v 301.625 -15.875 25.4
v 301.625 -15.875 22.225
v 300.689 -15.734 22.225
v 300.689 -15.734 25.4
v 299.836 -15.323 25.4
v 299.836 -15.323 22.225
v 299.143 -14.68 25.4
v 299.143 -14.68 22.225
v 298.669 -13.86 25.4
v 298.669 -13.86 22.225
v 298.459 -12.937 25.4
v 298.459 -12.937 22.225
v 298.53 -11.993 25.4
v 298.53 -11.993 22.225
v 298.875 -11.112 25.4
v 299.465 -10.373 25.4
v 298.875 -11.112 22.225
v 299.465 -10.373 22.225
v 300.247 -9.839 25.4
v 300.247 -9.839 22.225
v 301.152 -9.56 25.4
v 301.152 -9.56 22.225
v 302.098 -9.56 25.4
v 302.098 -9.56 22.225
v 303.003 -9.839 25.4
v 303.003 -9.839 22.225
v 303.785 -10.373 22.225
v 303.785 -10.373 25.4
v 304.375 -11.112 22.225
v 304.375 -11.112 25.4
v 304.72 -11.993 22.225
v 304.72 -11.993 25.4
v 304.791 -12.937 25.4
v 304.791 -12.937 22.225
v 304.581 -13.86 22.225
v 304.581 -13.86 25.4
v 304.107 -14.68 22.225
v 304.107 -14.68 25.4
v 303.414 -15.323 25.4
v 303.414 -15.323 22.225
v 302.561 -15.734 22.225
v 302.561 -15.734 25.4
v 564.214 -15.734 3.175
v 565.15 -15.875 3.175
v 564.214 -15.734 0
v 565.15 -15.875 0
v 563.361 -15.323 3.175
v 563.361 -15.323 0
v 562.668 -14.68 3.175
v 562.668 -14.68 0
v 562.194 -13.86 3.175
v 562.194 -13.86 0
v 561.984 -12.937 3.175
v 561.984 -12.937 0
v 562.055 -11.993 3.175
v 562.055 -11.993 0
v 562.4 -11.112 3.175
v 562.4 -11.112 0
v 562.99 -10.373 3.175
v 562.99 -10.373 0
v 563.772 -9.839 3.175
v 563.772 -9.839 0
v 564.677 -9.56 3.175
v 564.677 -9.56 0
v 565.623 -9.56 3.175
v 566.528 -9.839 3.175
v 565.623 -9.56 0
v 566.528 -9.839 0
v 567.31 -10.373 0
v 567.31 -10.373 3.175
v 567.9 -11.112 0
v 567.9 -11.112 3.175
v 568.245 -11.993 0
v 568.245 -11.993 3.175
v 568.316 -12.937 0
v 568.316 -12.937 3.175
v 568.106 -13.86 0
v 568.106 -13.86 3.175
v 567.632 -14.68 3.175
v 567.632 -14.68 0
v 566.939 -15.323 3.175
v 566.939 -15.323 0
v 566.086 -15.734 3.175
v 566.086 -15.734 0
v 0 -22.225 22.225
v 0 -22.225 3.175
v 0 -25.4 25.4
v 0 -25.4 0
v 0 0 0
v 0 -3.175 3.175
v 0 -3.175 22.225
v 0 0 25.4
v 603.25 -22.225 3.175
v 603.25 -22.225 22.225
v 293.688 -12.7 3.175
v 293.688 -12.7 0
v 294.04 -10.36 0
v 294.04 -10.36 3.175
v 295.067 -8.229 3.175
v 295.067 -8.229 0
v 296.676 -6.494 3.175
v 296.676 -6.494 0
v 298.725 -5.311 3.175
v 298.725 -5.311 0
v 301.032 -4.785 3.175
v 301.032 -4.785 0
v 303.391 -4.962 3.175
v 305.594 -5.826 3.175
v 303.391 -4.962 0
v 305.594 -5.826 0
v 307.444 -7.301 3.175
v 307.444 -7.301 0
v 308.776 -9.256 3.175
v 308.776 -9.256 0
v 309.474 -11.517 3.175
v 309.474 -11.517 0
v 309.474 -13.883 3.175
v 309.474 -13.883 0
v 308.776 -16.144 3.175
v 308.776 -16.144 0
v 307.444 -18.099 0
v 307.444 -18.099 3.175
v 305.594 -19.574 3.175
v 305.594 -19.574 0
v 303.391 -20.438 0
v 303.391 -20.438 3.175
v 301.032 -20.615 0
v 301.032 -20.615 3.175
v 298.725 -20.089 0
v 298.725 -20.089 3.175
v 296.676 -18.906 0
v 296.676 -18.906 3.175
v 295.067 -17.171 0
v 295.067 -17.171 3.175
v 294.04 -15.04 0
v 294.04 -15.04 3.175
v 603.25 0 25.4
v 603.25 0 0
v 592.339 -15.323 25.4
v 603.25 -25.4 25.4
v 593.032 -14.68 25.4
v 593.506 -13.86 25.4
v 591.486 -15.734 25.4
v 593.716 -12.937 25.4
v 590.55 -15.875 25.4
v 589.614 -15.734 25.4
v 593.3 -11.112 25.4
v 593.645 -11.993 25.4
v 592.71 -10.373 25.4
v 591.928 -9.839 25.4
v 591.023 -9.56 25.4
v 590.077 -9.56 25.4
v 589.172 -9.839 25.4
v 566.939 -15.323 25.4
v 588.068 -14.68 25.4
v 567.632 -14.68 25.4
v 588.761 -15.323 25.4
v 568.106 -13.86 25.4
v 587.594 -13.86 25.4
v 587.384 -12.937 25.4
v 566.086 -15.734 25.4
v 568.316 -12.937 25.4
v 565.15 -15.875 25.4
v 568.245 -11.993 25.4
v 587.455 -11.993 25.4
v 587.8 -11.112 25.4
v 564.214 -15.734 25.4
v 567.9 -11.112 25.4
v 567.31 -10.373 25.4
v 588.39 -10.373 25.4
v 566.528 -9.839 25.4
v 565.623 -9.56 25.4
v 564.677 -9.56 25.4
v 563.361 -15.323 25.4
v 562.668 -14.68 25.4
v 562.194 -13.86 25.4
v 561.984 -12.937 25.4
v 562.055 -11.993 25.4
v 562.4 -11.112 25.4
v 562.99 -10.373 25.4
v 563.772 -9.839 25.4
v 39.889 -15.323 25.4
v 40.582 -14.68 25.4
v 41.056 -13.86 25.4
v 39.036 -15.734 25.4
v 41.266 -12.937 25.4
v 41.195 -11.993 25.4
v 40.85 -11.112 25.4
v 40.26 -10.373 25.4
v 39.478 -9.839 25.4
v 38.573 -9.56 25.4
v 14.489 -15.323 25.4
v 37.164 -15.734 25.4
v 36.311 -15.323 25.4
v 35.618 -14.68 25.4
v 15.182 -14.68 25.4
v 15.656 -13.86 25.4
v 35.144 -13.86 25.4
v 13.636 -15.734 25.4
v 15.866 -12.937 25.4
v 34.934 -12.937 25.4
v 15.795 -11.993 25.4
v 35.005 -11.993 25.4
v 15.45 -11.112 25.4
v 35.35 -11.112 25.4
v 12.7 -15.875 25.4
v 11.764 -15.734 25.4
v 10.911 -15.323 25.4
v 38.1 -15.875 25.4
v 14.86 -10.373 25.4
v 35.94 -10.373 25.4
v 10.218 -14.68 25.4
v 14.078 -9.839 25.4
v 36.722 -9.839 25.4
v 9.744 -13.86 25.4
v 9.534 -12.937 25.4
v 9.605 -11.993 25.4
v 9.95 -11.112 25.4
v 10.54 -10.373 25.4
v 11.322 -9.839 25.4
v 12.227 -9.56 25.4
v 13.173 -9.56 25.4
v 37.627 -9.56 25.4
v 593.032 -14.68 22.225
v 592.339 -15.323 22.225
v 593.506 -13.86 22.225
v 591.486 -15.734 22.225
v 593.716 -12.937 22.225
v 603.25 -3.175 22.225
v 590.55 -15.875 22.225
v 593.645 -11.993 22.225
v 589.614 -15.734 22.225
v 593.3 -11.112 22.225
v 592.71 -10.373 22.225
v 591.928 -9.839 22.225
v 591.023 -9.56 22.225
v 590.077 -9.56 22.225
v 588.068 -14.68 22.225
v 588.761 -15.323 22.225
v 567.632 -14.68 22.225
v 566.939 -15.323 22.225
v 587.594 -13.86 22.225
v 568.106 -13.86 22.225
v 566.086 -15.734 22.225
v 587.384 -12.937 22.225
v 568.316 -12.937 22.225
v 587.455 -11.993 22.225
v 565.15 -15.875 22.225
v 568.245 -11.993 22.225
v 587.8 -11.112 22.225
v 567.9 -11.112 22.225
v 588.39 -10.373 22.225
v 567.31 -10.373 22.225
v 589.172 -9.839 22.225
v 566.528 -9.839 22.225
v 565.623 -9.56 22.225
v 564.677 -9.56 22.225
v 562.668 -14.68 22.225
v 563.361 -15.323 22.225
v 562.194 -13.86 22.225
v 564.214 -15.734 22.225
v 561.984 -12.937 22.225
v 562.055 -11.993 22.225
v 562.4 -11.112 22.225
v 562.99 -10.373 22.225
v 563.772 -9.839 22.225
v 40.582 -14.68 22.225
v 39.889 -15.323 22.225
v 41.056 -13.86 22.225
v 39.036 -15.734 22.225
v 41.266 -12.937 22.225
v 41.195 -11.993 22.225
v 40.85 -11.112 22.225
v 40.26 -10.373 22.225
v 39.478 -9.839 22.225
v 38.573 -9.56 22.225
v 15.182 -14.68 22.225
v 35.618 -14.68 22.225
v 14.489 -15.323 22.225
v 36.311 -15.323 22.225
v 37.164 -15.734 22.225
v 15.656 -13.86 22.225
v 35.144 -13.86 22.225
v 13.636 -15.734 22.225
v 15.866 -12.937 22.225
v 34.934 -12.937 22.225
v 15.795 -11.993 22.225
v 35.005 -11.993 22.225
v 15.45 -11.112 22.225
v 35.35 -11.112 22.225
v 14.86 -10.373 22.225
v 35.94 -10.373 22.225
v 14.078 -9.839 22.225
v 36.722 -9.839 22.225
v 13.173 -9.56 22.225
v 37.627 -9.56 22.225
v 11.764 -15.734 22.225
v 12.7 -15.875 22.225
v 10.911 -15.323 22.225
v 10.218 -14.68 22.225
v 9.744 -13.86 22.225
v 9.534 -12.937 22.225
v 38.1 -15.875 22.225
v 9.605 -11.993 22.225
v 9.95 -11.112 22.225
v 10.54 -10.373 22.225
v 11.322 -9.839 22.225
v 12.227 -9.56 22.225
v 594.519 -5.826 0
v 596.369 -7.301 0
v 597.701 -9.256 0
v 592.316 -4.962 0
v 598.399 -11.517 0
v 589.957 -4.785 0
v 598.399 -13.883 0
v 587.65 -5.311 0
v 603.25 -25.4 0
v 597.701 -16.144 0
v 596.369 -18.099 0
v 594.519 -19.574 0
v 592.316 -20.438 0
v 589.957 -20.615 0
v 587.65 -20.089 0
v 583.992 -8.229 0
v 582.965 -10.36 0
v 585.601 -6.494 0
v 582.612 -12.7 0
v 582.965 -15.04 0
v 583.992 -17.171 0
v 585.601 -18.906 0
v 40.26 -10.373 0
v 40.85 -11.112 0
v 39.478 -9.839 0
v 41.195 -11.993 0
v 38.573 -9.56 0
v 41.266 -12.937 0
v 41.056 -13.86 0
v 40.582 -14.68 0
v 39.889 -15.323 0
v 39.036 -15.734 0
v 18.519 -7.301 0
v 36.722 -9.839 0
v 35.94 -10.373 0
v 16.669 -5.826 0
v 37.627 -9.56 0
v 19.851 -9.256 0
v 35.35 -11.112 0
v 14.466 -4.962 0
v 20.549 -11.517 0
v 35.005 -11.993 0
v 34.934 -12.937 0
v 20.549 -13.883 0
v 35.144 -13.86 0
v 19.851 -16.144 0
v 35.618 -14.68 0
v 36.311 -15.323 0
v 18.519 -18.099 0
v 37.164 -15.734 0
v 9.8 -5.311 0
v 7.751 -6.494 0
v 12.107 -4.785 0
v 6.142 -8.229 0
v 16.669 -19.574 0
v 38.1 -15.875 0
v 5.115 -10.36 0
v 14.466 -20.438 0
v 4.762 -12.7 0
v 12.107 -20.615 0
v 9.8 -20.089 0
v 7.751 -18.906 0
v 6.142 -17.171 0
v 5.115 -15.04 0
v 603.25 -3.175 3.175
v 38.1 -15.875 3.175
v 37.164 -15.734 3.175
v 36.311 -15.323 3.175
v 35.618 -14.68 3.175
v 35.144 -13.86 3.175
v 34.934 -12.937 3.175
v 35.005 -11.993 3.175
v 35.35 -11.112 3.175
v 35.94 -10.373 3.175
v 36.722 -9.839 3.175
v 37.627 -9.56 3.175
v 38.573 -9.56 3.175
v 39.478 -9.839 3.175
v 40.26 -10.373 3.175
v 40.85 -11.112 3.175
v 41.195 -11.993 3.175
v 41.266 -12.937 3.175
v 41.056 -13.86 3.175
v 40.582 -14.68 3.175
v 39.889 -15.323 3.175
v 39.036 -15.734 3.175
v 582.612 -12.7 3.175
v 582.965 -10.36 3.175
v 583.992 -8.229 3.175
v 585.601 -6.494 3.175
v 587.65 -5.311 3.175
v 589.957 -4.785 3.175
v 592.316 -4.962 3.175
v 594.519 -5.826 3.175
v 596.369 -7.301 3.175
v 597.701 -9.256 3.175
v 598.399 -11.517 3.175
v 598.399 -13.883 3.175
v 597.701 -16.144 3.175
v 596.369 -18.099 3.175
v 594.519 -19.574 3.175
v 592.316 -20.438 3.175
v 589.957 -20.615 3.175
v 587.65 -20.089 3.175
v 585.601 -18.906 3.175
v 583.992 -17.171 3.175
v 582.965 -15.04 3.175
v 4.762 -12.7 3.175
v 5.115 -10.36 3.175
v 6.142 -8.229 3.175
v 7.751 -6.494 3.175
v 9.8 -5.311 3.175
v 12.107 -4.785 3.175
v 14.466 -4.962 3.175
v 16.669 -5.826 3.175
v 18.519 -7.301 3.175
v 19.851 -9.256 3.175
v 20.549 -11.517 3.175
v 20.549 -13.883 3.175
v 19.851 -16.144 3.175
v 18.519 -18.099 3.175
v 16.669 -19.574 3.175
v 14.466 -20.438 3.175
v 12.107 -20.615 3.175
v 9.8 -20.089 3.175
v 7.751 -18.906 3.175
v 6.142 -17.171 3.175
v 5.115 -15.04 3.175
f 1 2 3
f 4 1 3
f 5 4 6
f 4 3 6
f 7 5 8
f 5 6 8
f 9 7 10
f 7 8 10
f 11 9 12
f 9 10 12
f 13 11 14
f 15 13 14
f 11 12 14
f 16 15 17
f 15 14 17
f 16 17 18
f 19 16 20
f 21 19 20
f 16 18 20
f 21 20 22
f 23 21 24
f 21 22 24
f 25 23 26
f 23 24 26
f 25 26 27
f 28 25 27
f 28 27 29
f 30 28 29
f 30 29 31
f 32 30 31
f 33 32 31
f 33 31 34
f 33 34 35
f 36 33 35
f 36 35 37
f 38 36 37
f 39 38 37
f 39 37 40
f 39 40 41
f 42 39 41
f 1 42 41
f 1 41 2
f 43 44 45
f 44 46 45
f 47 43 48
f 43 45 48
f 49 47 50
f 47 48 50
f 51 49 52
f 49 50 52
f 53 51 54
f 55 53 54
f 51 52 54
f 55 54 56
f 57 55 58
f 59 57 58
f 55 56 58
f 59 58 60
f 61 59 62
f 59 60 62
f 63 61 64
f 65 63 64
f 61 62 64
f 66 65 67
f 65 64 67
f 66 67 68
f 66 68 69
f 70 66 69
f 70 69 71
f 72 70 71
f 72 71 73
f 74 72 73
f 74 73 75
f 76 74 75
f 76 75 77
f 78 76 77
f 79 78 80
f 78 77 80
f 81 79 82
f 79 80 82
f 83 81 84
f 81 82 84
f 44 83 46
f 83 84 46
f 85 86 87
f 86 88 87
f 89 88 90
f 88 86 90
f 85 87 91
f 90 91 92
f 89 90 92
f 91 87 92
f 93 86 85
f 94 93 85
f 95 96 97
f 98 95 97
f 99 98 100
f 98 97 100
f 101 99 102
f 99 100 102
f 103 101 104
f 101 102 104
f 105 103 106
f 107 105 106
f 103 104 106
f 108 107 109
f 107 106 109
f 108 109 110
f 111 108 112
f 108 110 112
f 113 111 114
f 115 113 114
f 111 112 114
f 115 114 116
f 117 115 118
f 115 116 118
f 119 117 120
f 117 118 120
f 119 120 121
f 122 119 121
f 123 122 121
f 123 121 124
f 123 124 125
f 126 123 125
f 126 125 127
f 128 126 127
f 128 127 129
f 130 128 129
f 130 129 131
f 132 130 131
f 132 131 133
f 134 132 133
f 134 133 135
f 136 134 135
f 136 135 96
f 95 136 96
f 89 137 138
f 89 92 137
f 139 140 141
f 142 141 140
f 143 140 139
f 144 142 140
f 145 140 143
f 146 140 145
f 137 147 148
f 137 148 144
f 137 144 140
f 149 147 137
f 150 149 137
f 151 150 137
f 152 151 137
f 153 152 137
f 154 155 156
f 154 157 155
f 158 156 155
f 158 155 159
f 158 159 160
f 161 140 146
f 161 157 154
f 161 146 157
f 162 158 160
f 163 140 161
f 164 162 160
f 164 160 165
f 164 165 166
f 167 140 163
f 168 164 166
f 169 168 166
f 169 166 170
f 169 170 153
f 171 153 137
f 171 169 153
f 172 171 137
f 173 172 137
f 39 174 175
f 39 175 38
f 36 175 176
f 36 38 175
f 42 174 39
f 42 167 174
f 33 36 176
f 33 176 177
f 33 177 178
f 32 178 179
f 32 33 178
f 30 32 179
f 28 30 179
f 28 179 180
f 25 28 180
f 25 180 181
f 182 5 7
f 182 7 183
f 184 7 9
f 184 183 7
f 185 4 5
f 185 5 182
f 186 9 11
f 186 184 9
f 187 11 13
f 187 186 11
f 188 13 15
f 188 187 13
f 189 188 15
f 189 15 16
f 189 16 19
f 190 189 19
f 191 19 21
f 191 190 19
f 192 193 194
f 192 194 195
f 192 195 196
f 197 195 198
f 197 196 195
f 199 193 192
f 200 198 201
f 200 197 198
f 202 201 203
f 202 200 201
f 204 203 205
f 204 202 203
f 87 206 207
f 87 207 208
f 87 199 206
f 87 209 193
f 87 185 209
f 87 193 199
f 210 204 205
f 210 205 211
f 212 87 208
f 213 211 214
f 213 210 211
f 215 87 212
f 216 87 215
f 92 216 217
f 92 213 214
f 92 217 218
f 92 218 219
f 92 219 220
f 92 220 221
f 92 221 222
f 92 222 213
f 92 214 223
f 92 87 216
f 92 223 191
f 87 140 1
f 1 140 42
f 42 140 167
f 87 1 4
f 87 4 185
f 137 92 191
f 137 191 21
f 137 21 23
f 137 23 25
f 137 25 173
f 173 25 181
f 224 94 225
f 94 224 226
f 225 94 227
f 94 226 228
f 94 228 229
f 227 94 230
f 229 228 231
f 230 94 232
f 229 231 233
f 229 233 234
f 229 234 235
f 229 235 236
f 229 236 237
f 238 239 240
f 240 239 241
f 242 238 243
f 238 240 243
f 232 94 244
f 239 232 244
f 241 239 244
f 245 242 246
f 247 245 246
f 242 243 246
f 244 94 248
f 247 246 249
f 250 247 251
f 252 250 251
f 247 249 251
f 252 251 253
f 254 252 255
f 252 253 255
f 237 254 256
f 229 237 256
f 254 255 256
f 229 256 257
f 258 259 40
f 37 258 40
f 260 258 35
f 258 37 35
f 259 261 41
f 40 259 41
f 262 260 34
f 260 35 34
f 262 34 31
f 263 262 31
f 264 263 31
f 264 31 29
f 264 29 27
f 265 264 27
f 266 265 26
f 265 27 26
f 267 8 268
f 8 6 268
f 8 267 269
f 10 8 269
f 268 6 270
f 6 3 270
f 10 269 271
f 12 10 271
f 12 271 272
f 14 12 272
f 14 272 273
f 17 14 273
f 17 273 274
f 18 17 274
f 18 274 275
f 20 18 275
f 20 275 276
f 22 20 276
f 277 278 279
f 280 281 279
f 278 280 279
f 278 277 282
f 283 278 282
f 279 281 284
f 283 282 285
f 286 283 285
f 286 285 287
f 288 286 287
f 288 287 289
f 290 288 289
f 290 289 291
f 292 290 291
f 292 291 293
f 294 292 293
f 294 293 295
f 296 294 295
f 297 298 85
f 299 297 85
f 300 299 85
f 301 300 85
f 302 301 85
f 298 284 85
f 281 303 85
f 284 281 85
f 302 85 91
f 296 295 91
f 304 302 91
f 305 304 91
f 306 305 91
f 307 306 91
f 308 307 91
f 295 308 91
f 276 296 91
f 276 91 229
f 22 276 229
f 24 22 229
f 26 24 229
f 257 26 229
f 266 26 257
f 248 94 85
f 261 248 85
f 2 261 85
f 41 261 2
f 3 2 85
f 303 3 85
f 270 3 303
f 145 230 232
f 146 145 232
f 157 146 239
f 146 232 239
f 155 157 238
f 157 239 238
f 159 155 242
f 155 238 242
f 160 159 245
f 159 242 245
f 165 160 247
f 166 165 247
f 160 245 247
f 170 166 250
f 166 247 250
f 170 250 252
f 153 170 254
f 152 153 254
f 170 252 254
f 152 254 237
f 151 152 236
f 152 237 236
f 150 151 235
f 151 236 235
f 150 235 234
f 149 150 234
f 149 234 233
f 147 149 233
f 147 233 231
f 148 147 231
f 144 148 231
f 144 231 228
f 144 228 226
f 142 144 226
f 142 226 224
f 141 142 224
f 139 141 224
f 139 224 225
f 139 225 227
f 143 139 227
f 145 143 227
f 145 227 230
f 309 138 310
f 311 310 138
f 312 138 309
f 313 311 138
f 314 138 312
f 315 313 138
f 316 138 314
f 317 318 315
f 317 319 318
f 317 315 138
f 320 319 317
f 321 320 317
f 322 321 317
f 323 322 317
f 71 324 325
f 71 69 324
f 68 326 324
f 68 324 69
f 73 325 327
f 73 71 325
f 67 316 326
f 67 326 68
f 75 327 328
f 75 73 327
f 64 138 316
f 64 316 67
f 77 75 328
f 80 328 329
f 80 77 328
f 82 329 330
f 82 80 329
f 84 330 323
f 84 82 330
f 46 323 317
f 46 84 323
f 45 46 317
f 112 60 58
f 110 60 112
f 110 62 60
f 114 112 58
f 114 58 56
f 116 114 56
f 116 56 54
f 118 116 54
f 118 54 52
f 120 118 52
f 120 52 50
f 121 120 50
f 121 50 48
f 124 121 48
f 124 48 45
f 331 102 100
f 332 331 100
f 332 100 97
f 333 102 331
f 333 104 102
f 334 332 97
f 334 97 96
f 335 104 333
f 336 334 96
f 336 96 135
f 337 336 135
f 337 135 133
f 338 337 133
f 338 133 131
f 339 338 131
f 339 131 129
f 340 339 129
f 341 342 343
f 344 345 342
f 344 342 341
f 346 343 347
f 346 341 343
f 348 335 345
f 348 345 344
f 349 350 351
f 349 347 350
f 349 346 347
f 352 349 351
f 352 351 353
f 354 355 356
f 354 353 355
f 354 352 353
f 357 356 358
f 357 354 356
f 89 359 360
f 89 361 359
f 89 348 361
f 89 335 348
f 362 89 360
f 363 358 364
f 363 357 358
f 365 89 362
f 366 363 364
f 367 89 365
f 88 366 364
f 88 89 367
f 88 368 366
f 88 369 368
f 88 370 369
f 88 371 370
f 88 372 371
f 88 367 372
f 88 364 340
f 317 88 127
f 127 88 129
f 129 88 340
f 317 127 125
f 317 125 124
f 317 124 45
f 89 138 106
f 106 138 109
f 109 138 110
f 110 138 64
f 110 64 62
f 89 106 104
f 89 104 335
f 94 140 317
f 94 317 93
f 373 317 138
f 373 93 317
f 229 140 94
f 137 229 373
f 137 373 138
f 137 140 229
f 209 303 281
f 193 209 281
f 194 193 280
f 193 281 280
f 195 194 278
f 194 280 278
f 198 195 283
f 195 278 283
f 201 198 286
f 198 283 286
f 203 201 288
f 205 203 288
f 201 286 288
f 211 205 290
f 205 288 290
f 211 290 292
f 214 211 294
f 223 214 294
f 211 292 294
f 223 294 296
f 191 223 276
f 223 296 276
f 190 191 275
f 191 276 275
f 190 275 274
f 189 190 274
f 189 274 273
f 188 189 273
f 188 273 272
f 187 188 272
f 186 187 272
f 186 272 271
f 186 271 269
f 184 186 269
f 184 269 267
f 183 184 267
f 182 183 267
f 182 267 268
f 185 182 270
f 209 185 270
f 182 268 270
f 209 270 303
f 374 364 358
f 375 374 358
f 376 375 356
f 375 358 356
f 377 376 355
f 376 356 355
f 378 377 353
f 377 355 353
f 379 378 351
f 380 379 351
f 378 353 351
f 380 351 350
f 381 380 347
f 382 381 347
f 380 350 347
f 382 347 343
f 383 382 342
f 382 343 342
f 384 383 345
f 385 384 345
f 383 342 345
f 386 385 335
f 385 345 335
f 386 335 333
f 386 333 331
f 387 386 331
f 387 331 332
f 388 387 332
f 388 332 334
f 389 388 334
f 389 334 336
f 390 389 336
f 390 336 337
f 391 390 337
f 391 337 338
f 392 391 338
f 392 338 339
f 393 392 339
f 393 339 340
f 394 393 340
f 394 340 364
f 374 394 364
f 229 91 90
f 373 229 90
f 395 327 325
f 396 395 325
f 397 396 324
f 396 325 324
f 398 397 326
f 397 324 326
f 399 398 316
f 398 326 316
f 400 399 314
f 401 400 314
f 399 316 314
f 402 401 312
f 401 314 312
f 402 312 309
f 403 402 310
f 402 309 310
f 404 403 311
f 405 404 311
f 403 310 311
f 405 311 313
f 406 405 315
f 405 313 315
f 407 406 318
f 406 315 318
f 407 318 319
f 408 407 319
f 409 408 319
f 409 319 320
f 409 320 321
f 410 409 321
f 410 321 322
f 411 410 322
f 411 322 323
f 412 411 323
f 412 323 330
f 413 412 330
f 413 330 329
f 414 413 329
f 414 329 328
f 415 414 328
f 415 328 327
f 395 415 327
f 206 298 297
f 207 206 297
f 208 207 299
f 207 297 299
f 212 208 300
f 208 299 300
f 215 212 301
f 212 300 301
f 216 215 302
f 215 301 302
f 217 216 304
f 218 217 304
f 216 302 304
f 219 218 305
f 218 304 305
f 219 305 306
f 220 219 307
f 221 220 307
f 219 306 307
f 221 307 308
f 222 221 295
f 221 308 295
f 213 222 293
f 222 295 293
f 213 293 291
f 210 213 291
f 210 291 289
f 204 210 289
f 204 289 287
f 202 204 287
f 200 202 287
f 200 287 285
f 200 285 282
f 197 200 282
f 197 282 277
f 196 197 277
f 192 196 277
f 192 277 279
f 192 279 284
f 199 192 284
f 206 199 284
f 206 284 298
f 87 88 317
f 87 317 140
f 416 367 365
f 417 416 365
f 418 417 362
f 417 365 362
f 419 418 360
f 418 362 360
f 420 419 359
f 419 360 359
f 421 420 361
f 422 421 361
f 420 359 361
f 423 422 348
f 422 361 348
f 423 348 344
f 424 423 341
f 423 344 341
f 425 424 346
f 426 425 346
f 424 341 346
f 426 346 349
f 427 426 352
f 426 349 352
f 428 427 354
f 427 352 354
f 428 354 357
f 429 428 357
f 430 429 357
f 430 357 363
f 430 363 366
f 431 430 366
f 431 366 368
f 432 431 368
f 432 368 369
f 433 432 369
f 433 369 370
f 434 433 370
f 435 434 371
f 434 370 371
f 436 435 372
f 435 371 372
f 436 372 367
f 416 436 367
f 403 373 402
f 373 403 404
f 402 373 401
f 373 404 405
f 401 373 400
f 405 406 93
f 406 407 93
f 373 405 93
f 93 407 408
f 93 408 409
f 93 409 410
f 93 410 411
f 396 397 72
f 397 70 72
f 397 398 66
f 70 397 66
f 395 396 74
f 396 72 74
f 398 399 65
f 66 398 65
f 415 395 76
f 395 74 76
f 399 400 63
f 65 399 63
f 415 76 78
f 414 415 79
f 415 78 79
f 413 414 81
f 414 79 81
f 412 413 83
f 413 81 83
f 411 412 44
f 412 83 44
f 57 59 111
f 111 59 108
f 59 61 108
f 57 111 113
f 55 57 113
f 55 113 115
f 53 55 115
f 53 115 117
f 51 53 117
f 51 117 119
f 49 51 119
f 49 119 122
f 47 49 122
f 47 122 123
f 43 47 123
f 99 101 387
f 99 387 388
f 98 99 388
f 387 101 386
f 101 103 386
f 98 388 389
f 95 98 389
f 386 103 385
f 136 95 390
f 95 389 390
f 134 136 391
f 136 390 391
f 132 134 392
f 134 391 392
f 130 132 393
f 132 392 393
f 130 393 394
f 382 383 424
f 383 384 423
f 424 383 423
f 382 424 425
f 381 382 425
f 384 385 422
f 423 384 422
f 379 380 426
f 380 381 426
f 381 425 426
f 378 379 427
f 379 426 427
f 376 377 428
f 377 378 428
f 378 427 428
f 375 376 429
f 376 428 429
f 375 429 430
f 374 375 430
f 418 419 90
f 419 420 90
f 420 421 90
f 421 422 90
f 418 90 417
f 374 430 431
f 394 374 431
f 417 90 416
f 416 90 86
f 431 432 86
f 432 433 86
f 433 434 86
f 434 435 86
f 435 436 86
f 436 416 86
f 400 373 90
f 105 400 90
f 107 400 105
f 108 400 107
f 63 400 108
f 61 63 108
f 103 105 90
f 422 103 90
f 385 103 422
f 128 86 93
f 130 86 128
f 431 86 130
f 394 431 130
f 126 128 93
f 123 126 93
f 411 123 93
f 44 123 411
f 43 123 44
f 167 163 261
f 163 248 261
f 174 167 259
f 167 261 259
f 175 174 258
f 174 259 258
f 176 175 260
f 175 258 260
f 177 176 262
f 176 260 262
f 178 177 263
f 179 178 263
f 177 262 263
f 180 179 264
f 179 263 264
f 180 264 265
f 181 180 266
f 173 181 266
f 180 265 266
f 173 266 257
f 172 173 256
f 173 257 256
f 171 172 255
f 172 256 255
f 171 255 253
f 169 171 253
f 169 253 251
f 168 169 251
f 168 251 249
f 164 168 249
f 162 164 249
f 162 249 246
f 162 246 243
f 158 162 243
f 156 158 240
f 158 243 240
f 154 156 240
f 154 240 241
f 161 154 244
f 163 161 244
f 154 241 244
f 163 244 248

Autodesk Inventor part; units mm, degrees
ref_plane "YZ Plane" through (0, 0, 0) normal (1, 0, 0) x (0, 1, 0)
ref_plane "XZ Plane" through (0, 0, 0) normal (0, 1, 0) x (-1, 0, 0)
ref_plane "XY Plane" through (0, 0, 0) normal (0, 0, 1) x (1, 0, 0)
sketch "Sketch1" plane through (0, 0, 0) normal (1, 0, 0) x (0, 1, 0)
  line L0 (0, 0) -> (-25.4, 0)
  line L1 (-25.4, 0) -> (-25.4, 25.4)
  line L2 (-25.4, 25.4) -> (0, 25.4)
  line L3 (0, 25.4) -> (0, 0)
  line L4 (-3.175, 3.175) -> (-22.225, 3.175)
  line L5 (-22.225, 3.175) -> (-22.225, 22.225)
  line L6 (-22.225, 22.225) -> (-3.175, 22.225)
  line L7 (-3.175, 22.225) -> (-3.175, 3.175)
  dimension "d0" = 25.4
  dimension "d1" = 25.4
  dimension "d2" = 19.05
  dimension "d3" = 19.05
  dimension "d4" = 3.175
  dimension "d5" = 3.175
extrude "Extrusion1" add sketch "Sketch1" along normal blind 603.25
sketch "Sketch2" plane through (0, -25.4, 25.4) normal (0, 0, 1) x (1, 0, 0)
  line L0 (0, 0) -> (0, 25.4) projected
  line L1 (0, 0) -> (603.25, 0) projected
  line L2 (603.25, 25.4) -> (603.25, 0) projected
  line L3 (0, 25.4) -> (603.25, 25.4) projected
  point P0 (12.7, 12.7)
  point P1 (301.625, 12.7)
  point P2 (590.55, 12.7)
  dimension "d8" = 12.7
  dimension "d9" = 12.7
  dimension "d10" = 12.7
  dimension "d11" = 12.7
  dimension "d12" = 12.7
  dimension "d13" = 301.625
hole "Hole1" at (12.7, -12.7, 25.4) at (301.625, -12.7, 25.4) at (590.55, -12.7, 25.4) direction (0, 0, -1) diameter 6.35 end through all
sketch "Sketch3" plane through (0, -25.4, 0) normal (0, 0, -1) x (-1, 0, 0)
  circle A0 centre (-301.625, 12.7) radius 3.175 projected
  circle A1 centre (-12.7, 12.7) radius 3.175 projected
  circle A2 centre (-590.55, 12.7) radius 3.175 projected
  line L0 (0, 25.4) -> (0, 0) projected
  line L1 (0, 25.4) -> (-603.25, 25.4) projected
  line L2 (-603.25, 0) -> (-603.25, 25.4) projected
  line L3 (0, 0) -> (-603.25, 0) projected
  circle A3 centre (-12.7, 12.7) radius 3.175 projected
  circle A4 centre (-12.7, 12.7) radius 7.9375
  circle A5 centre (-301.625, 12.7) radius 7.9375
  circle A6 centre (-590.55, 12.7) radius 3.175 projected
  circle A7 centre (-590.55, 12.7) radius 7.9375
  dimension "d21" = 15.875
  dimension "d22" = 15.875
  dimension "d23" = 15.875
extrude "Extrusion2" cut sketch "Sketch3" against normal blind 12.7 contours A4 | A5 | A7
sketch "Sketch4" plane through (0, -25.4, 25.4) normal (0, 0, 1) x (1, 0, 0)
  circle A0 centre (301.625, 12.7) radius 3.175 projected
  circle A1 centre (12.7, 12.7) radius 3.175 projected
  circle A2 centre (590.55, 12.7) radius 3.175 projected
  line L0 (0, 0) -> (0, 25.4) projected
  line L1 (0, 0) -> (603.25, 0) projected
  line L2 (603.25, 25.4) -> (603.25, 0) projected
  line L3 (0, 25.4) -> (603.25, 25.4) projected
  point P0 (38.1, 12.7)
  point P1 (565.15, 12.7)
  dimension "d26" = 12.7
  dimension "d27" = 38.1
  dimension "d28" = 12.7
  dimension "d29" = 38.1
hole "Hole2" at (38.1, -12.7, 25.4) at (565.15, -12.7, 25.4) direction (0, 0, -1) diameter 6.35 end through all
properties part number "1x1 support horizontal"
